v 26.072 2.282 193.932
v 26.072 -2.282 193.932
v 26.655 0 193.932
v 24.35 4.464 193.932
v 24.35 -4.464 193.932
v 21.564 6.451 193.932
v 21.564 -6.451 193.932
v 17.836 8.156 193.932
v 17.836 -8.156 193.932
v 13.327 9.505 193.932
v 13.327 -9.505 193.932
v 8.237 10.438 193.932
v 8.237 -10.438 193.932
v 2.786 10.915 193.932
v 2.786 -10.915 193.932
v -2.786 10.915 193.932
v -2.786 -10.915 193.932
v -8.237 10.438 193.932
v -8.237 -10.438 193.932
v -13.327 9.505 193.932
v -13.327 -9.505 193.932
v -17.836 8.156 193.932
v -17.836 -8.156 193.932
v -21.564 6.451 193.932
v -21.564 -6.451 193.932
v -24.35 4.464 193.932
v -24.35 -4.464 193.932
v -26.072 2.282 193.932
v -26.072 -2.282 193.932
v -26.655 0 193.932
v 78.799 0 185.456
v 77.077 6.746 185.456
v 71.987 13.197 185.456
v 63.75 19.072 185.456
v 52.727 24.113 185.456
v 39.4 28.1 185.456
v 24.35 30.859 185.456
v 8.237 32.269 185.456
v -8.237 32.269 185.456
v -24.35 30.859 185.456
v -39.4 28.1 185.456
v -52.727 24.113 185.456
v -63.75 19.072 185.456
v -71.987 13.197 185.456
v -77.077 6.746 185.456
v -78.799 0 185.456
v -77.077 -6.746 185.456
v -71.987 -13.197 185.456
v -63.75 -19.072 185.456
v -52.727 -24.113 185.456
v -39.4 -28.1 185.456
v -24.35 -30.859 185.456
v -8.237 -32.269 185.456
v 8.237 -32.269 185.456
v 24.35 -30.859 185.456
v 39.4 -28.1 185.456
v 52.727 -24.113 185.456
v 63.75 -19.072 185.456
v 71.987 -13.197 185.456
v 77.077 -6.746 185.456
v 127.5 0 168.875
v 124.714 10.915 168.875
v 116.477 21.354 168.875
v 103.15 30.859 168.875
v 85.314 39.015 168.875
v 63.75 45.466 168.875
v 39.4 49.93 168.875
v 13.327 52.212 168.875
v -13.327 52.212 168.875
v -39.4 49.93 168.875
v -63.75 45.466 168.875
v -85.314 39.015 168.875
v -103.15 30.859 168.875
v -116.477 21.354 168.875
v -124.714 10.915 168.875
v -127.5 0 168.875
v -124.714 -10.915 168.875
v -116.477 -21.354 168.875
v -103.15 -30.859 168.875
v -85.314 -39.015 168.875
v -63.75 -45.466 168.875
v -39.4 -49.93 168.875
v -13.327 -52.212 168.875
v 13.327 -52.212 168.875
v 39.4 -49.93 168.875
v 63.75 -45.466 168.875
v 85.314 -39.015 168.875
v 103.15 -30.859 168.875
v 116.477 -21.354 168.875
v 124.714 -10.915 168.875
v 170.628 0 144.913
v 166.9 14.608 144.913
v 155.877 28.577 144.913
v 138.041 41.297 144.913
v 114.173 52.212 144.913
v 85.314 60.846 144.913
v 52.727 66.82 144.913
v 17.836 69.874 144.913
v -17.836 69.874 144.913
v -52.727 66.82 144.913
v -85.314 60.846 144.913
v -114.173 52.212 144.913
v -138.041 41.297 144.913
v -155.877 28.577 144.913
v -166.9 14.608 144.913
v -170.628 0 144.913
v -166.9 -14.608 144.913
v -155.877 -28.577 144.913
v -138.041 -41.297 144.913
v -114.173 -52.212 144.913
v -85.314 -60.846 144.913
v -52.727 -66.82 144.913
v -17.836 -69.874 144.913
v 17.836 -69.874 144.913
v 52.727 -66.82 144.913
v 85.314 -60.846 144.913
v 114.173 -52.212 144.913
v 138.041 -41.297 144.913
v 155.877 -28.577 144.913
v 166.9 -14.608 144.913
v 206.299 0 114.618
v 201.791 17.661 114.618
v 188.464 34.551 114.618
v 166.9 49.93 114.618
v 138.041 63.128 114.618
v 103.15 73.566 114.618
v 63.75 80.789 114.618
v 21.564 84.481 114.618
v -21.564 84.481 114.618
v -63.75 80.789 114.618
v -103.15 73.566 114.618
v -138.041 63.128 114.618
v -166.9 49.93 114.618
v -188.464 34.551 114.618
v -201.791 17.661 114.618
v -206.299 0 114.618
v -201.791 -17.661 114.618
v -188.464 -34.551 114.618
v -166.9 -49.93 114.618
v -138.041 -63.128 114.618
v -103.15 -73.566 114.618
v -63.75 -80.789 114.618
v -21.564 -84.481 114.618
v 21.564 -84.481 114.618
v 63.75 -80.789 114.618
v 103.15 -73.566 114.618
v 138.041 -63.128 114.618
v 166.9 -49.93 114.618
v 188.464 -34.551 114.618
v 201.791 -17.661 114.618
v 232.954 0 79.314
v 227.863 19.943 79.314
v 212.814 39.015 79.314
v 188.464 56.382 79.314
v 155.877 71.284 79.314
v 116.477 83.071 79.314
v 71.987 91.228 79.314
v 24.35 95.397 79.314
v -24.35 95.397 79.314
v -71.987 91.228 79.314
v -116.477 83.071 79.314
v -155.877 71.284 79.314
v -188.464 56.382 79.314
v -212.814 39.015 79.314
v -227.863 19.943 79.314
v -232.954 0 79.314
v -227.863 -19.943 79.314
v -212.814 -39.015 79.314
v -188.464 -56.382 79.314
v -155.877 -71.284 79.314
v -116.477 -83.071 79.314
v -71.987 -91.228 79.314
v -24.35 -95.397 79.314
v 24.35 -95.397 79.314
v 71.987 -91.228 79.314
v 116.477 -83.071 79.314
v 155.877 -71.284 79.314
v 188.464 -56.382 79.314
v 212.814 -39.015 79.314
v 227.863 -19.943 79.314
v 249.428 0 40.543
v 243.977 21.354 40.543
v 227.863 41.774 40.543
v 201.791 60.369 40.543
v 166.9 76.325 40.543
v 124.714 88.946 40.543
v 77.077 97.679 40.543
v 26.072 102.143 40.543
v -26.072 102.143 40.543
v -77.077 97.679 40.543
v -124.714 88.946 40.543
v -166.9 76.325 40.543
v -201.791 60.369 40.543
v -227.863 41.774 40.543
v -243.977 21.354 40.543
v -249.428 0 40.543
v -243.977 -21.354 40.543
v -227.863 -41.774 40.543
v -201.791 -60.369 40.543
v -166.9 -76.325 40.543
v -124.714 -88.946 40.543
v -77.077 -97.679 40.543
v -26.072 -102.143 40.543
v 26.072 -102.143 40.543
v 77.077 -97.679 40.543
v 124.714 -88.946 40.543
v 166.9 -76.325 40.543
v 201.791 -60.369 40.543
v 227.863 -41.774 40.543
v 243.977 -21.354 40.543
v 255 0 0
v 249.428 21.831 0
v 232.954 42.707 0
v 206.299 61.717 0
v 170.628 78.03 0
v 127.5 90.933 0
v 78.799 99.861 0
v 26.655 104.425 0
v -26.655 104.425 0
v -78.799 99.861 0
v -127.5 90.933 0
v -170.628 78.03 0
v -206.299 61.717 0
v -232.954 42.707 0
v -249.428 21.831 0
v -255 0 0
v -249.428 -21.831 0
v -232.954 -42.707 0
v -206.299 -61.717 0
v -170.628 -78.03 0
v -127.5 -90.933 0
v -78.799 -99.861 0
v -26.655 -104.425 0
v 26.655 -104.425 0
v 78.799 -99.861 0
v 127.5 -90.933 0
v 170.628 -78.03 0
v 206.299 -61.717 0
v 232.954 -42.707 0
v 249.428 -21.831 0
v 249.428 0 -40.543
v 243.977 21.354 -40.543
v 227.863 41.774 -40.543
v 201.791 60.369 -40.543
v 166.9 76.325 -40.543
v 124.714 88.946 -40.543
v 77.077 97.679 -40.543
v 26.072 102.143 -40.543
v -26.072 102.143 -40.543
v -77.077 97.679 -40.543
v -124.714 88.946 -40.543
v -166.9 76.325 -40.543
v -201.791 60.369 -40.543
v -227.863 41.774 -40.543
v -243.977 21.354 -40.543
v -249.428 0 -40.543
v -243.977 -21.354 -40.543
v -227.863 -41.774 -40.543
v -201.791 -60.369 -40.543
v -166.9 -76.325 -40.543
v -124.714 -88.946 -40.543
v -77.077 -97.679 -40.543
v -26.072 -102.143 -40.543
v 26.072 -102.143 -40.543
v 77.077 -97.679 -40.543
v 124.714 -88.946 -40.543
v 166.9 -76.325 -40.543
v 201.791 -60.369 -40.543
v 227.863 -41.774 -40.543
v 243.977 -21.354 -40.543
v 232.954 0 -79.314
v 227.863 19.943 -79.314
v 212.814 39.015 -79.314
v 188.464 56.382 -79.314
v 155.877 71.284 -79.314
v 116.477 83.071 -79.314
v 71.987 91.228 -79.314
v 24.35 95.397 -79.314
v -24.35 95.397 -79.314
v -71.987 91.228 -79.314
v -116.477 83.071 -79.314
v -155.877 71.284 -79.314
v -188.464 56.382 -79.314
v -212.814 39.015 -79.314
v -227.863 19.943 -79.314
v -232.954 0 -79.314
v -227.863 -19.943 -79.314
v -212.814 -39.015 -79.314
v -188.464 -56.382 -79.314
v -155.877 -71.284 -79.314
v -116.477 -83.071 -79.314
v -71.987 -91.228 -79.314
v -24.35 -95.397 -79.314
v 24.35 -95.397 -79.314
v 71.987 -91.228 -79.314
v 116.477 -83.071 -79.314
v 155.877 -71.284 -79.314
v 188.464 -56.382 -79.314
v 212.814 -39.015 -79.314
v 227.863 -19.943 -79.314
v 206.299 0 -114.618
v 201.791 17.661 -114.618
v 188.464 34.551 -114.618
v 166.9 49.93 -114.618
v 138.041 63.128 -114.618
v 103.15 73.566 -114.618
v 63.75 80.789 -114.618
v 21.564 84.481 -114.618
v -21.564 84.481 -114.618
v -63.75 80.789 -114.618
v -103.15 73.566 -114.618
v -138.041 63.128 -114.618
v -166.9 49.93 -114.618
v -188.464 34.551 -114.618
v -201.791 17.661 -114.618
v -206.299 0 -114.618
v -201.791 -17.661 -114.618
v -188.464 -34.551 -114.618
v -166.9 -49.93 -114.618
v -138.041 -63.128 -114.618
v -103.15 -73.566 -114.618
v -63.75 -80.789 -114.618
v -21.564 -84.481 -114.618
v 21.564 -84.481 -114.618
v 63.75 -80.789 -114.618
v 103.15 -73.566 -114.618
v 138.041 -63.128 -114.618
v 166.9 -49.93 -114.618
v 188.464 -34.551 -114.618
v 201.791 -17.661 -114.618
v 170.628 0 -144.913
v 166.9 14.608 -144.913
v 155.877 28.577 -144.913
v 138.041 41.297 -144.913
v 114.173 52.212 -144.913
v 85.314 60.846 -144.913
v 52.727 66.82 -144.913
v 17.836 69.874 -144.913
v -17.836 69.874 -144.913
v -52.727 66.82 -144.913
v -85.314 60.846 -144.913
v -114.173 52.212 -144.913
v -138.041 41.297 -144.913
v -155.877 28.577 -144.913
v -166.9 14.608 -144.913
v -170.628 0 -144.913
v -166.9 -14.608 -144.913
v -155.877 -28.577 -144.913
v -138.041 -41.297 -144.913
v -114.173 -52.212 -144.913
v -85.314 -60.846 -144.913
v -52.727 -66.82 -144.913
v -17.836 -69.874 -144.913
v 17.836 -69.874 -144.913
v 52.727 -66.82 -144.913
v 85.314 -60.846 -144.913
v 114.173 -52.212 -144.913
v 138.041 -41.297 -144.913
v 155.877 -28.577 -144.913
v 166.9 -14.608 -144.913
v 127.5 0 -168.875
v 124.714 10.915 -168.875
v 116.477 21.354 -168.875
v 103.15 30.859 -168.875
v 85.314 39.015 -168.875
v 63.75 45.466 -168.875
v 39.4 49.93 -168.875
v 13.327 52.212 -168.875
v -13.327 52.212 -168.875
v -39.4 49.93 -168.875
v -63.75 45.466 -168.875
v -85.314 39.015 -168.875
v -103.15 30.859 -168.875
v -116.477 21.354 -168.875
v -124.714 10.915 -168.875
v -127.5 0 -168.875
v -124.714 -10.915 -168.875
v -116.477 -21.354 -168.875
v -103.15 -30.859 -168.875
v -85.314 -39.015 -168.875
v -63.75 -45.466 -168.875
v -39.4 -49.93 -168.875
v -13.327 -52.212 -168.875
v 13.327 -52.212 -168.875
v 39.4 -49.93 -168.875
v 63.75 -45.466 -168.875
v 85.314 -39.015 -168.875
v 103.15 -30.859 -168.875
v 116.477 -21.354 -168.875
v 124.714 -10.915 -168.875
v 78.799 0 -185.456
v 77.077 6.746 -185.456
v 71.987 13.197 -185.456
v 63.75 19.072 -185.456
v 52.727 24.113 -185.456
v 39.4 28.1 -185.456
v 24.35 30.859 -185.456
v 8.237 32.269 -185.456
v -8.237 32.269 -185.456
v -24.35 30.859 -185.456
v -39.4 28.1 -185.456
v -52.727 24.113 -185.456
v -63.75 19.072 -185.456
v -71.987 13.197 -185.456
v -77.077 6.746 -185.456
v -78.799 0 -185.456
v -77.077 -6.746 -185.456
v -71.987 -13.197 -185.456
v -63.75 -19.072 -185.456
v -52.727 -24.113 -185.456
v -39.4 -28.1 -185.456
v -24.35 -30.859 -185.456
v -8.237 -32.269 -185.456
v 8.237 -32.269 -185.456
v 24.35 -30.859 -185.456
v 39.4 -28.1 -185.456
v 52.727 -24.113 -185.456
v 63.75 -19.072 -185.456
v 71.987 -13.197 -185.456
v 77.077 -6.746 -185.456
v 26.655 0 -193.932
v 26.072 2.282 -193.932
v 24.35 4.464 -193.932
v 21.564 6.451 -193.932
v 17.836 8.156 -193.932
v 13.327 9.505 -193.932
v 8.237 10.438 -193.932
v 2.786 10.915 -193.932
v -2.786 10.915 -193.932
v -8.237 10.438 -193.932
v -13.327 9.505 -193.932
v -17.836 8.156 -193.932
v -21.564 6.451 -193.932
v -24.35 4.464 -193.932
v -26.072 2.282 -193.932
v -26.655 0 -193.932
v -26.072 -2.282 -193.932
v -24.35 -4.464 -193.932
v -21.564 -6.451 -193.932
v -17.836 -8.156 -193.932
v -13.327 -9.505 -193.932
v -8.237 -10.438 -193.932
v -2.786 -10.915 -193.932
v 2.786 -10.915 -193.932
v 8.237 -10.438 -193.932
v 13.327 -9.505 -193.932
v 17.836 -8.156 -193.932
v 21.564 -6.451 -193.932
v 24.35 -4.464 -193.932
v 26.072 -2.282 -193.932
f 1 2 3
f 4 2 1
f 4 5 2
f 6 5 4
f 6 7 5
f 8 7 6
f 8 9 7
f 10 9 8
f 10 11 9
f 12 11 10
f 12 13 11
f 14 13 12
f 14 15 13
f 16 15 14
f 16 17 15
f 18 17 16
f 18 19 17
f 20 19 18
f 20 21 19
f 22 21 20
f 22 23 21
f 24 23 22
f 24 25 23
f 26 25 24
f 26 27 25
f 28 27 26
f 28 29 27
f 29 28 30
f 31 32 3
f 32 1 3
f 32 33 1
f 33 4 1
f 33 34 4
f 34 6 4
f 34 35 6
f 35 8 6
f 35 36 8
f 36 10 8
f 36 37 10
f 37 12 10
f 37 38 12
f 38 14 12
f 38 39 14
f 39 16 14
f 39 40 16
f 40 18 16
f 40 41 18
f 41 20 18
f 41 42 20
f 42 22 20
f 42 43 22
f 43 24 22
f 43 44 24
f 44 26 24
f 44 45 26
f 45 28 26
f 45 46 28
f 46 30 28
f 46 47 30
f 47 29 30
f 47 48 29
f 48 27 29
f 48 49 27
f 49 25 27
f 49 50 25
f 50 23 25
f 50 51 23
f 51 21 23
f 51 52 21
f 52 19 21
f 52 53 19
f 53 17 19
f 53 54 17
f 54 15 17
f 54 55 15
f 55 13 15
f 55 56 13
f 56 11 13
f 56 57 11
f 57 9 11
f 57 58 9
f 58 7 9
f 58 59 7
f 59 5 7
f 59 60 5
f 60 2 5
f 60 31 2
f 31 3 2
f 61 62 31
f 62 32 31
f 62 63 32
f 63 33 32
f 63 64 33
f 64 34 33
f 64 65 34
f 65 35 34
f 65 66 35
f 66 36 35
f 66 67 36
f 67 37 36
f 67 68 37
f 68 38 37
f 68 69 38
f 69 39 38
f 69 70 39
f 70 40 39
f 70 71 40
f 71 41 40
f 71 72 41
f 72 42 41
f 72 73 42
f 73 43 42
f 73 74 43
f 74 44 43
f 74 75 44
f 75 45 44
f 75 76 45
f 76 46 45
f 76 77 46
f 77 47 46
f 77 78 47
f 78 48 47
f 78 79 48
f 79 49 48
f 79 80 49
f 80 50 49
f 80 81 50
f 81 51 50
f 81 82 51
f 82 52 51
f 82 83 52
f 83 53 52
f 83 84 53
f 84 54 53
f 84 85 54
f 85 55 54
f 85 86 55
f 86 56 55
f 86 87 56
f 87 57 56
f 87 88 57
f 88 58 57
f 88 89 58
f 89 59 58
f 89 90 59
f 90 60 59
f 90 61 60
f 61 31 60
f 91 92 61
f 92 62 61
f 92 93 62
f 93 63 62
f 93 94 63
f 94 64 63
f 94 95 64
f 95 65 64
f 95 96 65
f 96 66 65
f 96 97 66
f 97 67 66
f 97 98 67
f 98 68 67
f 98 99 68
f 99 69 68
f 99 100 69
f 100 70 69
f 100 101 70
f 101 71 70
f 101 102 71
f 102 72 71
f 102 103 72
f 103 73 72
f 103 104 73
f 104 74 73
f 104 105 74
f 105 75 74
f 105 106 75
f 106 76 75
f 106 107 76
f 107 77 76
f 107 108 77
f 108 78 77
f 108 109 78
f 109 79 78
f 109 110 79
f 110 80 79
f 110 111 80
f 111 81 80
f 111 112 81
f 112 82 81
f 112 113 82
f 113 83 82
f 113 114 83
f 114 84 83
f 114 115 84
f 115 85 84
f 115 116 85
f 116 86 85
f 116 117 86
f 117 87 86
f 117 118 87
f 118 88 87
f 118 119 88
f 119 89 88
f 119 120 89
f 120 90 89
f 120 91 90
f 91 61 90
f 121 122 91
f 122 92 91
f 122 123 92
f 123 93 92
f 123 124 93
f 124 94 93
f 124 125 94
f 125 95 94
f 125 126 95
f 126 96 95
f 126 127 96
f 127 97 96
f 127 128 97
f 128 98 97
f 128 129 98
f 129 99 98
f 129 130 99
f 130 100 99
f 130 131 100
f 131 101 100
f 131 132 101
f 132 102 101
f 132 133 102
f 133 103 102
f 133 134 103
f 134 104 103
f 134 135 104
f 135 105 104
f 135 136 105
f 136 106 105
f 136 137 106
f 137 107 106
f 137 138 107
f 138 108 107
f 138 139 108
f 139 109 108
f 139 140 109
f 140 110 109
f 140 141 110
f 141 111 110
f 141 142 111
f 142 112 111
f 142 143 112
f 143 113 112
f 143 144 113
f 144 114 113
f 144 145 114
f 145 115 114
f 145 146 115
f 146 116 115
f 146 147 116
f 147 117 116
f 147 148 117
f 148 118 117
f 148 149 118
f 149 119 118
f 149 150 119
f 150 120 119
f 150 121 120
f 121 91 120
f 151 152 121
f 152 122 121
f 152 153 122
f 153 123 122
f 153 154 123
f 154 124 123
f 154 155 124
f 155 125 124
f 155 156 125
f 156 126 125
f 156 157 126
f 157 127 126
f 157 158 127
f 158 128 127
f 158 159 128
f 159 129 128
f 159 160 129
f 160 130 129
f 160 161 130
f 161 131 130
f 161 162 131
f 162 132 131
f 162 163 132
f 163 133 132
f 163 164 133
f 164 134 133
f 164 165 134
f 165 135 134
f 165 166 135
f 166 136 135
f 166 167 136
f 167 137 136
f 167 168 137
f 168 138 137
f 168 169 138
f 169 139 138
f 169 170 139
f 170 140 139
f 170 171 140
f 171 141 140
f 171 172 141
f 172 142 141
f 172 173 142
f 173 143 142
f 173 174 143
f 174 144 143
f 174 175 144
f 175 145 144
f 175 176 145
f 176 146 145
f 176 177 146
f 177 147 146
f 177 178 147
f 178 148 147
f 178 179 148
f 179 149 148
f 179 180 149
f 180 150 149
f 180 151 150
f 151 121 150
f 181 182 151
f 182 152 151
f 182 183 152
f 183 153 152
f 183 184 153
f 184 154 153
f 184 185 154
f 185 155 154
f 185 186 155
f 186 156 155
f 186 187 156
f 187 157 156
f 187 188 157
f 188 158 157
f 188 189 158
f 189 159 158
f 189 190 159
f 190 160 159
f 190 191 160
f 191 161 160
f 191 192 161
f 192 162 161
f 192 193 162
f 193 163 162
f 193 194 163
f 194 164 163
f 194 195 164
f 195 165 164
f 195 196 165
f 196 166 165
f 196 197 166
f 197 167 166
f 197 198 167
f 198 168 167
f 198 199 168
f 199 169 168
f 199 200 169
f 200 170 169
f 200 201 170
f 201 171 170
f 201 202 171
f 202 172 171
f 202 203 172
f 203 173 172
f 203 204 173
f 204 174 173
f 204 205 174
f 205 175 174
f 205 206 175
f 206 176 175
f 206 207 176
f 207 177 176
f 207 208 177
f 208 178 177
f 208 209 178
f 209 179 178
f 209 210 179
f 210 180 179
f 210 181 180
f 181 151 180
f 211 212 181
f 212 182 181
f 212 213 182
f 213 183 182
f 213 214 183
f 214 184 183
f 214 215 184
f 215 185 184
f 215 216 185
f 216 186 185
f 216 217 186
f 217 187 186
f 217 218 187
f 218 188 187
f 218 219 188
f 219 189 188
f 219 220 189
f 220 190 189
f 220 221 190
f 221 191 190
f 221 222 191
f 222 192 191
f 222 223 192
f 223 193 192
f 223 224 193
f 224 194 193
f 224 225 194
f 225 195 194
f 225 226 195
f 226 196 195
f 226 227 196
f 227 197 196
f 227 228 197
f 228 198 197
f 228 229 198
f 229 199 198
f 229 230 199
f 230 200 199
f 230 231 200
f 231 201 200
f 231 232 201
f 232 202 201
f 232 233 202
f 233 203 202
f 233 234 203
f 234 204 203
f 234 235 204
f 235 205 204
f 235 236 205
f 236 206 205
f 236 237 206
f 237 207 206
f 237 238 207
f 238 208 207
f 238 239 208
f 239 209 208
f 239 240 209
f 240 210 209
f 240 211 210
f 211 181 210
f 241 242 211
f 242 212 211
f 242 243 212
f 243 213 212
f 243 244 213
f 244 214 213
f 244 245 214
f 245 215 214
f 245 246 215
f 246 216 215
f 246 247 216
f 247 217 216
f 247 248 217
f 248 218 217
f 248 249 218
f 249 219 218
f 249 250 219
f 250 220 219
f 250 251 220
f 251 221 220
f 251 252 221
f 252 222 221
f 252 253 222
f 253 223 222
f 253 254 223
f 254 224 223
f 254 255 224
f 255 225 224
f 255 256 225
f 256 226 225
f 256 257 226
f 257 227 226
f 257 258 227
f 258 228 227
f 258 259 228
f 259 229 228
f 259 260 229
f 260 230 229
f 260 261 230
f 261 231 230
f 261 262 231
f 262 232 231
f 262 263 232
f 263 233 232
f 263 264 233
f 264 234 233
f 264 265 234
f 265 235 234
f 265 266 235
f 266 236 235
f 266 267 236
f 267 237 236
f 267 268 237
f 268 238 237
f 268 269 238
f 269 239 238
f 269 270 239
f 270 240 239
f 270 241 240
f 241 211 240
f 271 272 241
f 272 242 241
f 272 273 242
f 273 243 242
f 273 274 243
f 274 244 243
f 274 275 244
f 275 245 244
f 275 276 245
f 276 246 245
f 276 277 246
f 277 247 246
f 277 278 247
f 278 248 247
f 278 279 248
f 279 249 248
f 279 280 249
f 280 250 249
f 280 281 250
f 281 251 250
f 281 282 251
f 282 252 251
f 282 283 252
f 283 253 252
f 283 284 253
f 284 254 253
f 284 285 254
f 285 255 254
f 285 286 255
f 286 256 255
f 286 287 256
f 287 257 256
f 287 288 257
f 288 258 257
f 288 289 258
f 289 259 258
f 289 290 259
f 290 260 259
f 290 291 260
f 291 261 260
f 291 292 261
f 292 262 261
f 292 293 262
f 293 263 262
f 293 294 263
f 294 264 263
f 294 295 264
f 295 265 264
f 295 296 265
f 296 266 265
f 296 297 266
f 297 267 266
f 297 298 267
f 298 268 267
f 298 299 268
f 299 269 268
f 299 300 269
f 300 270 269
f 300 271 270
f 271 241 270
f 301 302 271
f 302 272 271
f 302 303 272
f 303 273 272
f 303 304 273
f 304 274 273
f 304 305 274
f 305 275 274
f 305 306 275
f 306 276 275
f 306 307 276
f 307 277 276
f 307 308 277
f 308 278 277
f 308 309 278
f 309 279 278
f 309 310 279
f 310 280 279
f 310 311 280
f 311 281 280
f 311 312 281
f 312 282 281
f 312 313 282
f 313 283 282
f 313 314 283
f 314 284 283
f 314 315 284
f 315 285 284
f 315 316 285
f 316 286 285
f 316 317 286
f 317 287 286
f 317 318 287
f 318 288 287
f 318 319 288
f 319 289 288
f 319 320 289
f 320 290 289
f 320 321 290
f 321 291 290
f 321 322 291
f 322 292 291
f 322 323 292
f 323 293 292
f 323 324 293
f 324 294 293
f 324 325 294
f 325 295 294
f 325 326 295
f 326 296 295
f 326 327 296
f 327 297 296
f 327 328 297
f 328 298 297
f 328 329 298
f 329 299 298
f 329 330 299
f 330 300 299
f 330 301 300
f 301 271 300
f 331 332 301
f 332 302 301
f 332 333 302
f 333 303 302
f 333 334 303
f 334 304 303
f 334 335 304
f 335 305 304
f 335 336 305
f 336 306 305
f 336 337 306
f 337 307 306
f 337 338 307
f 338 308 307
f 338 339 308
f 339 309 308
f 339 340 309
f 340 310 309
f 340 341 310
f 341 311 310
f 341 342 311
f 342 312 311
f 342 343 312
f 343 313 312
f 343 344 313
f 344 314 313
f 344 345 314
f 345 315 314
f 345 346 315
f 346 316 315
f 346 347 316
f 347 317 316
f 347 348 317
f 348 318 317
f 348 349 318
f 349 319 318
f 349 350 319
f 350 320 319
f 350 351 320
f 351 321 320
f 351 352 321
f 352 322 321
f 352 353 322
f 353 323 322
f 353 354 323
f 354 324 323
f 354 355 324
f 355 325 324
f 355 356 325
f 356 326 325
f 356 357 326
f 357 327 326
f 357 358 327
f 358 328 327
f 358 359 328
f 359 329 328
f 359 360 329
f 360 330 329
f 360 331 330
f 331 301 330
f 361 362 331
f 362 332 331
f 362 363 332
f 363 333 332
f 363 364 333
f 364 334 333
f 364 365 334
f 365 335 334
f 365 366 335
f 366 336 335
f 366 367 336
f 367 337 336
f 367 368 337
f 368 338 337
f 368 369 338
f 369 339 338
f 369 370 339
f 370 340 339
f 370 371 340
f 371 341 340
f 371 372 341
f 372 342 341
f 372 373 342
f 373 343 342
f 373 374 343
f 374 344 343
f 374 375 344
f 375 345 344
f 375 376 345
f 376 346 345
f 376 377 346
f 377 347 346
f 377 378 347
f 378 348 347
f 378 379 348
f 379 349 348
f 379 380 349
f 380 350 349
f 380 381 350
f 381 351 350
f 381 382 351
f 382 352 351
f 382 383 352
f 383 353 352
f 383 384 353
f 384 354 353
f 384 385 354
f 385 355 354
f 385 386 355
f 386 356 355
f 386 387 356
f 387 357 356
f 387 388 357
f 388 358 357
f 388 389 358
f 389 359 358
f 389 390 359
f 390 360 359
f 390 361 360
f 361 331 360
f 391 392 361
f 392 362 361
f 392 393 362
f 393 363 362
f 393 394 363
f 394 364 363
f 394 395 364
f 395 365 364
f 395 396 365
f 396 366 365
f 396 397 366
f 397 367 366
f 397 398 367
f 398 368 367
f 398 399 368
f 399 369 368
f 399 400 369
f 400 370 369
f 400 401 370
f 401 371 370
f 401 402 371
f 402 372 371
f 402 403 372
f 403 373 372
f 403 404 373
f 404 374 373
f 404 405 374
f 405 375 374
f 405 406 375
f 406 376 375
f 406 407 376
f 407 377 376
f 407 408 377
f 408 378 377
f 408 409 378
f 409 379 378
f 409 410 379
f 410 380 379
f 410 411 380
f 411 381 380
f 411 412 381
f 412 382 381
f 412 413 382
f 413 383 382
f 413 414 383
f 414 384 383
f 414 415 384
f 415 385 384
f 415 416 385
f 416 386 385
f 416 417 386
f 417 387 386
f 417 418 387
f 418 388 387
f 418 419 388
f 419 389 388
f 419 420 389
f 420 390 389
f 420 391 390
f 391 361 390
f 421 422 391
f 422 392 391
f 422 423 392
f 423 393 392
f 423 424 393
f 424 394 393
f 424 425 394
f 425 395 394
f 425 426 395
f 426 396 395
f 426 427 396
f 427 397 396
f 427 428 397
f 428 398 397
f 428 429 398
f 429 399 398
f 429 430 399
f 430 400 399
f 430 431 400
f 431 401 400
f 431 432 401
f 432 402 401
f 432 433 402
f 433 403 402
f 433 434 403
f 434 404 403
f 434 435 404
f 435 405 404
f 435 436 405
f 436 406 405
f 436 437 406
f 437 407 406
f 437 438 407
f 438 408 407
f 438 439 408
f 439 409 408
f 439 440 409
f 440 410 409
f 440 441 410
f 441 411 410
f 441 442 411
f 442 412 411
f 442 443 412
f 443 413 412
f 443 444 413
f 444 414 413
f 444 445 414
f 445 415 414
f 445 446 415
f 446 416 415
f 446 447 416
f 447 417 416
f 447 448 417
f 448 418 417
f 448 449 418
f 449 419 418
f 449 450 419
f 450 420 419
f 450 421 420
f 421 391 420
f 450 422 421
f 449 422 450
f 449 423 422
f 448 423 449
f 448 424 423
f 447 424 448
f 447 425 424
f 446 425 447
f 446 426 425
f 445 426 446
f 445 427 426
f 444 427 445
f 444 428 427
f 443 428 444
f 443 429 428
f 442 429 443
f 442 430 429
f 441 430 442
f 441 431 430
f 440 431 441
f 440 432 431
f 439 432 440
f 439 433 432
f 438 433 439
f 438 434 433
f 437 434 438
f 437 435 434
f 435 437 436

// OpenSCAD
// Generated by SolidPython 1.0.1 on 2020-07-29 00:46:52


scale(v = [17, 7, 13]) {
	sphere(r = 15);
}
/***********************************************
*********      SolidPython code:      **********
************************************************
 
# import packages: SolidPython
from solid import *
from solid.utils import *
from itertools import chain, combinations, permutations


class Resize:

    def __init__(self, scad_file):
        self.scad_file = scad_file
        #self.scad_file = import_scad(scad_file)
        # cone/cylinder param:
        self.r1 = 0
        self.r2 = 0
        self.h = 0
        # rectangular prism param:
        self.w = 0
        self.l = 0
        # ellipse param:
        self.r = 0

    # import OpenScad code (file name corresponds to shape)


    # classify shape + parameters
    def assign(self, param1, param2, param3):
        if self.scad_file == 'cone.scad':
            self.r1 = param1
            self.r2 = param2
            self.h = param3
        elif self.scad_file == 'cylinder.scad':
            self.r1 = param1
            self.r2 = param2
            self.h = param3
        elif self.scad_file == 'rectangularPrism.scad':
            self.h = param1
            self.l = param2
            self.w = param3
        else:
            self.r = param1
            self.h = param2

    # resize parameters
    def iterate(self):
        x = range(3, 20, 2)
        i = 1
        if self.scad_file == 'cone.scad':
            tempList = list(permutations(x, 2))
            for temp in tempList:
                param1 = temp[0]
                param2 = temp[1]
                filepath = 'produced_scad_files/' + 'cone' + str(param1) + '_' + str(param2) + '_' + '.scad'
                scad_render_to_file(cylinder(h=param1, r1=param2, r2=0), filepath)

        elif self.scad_file == 'cylinder.scad':
            tempList = list(permutations(x, 3))
            for temp in tempList:
                param1 = temp[0]
                param2 = temp[1]
                filepath = 'produced_scad_files/' + 'cylinder' + str(param1) + '_' + str(param2) + '_' + '.scad'
                scad_render_to_file(cylinder(h=param1, r1=param2, r2=param2), filepath)

        elif self.scad_file == 'rectangularPrism.scad':
            tempList = list(permutations(x, 3))
            for temp in tempList:
                param1 = temp[0]
                param2 = temp[1]
                param3 = temp[2]
                filepath = 'produced_scad_files/' + 'rectangularPrism' + str(param1) + '_' + str(param2) + '_' + str(
                    param3) + '.scad'
                scad_render_to_file(cube(size=(param1, param2, param3)), filepath)

        elif self.scad_file == 'ellipse.scad':
            tempList = list(permutations(x, 4))
            for temp in tempList:
                param1 = temp[0]
                param2 = temp[1]
                param3 = temp[2]
                param4 = temp[3]
                filepath = 'produced_scad_files/' + 'ellipse' + str(param1) + '_' + str(param2) + '_' + str(param3) + '_' + str(param4) + '.scad'
                scad_render_to_file(scale([param1, param2, param3])(sphere(r=param4)), filepath)

    def render_to_scadfile(self):
        scad_render_to_file(scad, 'example.scad') 
 
************************************************/
